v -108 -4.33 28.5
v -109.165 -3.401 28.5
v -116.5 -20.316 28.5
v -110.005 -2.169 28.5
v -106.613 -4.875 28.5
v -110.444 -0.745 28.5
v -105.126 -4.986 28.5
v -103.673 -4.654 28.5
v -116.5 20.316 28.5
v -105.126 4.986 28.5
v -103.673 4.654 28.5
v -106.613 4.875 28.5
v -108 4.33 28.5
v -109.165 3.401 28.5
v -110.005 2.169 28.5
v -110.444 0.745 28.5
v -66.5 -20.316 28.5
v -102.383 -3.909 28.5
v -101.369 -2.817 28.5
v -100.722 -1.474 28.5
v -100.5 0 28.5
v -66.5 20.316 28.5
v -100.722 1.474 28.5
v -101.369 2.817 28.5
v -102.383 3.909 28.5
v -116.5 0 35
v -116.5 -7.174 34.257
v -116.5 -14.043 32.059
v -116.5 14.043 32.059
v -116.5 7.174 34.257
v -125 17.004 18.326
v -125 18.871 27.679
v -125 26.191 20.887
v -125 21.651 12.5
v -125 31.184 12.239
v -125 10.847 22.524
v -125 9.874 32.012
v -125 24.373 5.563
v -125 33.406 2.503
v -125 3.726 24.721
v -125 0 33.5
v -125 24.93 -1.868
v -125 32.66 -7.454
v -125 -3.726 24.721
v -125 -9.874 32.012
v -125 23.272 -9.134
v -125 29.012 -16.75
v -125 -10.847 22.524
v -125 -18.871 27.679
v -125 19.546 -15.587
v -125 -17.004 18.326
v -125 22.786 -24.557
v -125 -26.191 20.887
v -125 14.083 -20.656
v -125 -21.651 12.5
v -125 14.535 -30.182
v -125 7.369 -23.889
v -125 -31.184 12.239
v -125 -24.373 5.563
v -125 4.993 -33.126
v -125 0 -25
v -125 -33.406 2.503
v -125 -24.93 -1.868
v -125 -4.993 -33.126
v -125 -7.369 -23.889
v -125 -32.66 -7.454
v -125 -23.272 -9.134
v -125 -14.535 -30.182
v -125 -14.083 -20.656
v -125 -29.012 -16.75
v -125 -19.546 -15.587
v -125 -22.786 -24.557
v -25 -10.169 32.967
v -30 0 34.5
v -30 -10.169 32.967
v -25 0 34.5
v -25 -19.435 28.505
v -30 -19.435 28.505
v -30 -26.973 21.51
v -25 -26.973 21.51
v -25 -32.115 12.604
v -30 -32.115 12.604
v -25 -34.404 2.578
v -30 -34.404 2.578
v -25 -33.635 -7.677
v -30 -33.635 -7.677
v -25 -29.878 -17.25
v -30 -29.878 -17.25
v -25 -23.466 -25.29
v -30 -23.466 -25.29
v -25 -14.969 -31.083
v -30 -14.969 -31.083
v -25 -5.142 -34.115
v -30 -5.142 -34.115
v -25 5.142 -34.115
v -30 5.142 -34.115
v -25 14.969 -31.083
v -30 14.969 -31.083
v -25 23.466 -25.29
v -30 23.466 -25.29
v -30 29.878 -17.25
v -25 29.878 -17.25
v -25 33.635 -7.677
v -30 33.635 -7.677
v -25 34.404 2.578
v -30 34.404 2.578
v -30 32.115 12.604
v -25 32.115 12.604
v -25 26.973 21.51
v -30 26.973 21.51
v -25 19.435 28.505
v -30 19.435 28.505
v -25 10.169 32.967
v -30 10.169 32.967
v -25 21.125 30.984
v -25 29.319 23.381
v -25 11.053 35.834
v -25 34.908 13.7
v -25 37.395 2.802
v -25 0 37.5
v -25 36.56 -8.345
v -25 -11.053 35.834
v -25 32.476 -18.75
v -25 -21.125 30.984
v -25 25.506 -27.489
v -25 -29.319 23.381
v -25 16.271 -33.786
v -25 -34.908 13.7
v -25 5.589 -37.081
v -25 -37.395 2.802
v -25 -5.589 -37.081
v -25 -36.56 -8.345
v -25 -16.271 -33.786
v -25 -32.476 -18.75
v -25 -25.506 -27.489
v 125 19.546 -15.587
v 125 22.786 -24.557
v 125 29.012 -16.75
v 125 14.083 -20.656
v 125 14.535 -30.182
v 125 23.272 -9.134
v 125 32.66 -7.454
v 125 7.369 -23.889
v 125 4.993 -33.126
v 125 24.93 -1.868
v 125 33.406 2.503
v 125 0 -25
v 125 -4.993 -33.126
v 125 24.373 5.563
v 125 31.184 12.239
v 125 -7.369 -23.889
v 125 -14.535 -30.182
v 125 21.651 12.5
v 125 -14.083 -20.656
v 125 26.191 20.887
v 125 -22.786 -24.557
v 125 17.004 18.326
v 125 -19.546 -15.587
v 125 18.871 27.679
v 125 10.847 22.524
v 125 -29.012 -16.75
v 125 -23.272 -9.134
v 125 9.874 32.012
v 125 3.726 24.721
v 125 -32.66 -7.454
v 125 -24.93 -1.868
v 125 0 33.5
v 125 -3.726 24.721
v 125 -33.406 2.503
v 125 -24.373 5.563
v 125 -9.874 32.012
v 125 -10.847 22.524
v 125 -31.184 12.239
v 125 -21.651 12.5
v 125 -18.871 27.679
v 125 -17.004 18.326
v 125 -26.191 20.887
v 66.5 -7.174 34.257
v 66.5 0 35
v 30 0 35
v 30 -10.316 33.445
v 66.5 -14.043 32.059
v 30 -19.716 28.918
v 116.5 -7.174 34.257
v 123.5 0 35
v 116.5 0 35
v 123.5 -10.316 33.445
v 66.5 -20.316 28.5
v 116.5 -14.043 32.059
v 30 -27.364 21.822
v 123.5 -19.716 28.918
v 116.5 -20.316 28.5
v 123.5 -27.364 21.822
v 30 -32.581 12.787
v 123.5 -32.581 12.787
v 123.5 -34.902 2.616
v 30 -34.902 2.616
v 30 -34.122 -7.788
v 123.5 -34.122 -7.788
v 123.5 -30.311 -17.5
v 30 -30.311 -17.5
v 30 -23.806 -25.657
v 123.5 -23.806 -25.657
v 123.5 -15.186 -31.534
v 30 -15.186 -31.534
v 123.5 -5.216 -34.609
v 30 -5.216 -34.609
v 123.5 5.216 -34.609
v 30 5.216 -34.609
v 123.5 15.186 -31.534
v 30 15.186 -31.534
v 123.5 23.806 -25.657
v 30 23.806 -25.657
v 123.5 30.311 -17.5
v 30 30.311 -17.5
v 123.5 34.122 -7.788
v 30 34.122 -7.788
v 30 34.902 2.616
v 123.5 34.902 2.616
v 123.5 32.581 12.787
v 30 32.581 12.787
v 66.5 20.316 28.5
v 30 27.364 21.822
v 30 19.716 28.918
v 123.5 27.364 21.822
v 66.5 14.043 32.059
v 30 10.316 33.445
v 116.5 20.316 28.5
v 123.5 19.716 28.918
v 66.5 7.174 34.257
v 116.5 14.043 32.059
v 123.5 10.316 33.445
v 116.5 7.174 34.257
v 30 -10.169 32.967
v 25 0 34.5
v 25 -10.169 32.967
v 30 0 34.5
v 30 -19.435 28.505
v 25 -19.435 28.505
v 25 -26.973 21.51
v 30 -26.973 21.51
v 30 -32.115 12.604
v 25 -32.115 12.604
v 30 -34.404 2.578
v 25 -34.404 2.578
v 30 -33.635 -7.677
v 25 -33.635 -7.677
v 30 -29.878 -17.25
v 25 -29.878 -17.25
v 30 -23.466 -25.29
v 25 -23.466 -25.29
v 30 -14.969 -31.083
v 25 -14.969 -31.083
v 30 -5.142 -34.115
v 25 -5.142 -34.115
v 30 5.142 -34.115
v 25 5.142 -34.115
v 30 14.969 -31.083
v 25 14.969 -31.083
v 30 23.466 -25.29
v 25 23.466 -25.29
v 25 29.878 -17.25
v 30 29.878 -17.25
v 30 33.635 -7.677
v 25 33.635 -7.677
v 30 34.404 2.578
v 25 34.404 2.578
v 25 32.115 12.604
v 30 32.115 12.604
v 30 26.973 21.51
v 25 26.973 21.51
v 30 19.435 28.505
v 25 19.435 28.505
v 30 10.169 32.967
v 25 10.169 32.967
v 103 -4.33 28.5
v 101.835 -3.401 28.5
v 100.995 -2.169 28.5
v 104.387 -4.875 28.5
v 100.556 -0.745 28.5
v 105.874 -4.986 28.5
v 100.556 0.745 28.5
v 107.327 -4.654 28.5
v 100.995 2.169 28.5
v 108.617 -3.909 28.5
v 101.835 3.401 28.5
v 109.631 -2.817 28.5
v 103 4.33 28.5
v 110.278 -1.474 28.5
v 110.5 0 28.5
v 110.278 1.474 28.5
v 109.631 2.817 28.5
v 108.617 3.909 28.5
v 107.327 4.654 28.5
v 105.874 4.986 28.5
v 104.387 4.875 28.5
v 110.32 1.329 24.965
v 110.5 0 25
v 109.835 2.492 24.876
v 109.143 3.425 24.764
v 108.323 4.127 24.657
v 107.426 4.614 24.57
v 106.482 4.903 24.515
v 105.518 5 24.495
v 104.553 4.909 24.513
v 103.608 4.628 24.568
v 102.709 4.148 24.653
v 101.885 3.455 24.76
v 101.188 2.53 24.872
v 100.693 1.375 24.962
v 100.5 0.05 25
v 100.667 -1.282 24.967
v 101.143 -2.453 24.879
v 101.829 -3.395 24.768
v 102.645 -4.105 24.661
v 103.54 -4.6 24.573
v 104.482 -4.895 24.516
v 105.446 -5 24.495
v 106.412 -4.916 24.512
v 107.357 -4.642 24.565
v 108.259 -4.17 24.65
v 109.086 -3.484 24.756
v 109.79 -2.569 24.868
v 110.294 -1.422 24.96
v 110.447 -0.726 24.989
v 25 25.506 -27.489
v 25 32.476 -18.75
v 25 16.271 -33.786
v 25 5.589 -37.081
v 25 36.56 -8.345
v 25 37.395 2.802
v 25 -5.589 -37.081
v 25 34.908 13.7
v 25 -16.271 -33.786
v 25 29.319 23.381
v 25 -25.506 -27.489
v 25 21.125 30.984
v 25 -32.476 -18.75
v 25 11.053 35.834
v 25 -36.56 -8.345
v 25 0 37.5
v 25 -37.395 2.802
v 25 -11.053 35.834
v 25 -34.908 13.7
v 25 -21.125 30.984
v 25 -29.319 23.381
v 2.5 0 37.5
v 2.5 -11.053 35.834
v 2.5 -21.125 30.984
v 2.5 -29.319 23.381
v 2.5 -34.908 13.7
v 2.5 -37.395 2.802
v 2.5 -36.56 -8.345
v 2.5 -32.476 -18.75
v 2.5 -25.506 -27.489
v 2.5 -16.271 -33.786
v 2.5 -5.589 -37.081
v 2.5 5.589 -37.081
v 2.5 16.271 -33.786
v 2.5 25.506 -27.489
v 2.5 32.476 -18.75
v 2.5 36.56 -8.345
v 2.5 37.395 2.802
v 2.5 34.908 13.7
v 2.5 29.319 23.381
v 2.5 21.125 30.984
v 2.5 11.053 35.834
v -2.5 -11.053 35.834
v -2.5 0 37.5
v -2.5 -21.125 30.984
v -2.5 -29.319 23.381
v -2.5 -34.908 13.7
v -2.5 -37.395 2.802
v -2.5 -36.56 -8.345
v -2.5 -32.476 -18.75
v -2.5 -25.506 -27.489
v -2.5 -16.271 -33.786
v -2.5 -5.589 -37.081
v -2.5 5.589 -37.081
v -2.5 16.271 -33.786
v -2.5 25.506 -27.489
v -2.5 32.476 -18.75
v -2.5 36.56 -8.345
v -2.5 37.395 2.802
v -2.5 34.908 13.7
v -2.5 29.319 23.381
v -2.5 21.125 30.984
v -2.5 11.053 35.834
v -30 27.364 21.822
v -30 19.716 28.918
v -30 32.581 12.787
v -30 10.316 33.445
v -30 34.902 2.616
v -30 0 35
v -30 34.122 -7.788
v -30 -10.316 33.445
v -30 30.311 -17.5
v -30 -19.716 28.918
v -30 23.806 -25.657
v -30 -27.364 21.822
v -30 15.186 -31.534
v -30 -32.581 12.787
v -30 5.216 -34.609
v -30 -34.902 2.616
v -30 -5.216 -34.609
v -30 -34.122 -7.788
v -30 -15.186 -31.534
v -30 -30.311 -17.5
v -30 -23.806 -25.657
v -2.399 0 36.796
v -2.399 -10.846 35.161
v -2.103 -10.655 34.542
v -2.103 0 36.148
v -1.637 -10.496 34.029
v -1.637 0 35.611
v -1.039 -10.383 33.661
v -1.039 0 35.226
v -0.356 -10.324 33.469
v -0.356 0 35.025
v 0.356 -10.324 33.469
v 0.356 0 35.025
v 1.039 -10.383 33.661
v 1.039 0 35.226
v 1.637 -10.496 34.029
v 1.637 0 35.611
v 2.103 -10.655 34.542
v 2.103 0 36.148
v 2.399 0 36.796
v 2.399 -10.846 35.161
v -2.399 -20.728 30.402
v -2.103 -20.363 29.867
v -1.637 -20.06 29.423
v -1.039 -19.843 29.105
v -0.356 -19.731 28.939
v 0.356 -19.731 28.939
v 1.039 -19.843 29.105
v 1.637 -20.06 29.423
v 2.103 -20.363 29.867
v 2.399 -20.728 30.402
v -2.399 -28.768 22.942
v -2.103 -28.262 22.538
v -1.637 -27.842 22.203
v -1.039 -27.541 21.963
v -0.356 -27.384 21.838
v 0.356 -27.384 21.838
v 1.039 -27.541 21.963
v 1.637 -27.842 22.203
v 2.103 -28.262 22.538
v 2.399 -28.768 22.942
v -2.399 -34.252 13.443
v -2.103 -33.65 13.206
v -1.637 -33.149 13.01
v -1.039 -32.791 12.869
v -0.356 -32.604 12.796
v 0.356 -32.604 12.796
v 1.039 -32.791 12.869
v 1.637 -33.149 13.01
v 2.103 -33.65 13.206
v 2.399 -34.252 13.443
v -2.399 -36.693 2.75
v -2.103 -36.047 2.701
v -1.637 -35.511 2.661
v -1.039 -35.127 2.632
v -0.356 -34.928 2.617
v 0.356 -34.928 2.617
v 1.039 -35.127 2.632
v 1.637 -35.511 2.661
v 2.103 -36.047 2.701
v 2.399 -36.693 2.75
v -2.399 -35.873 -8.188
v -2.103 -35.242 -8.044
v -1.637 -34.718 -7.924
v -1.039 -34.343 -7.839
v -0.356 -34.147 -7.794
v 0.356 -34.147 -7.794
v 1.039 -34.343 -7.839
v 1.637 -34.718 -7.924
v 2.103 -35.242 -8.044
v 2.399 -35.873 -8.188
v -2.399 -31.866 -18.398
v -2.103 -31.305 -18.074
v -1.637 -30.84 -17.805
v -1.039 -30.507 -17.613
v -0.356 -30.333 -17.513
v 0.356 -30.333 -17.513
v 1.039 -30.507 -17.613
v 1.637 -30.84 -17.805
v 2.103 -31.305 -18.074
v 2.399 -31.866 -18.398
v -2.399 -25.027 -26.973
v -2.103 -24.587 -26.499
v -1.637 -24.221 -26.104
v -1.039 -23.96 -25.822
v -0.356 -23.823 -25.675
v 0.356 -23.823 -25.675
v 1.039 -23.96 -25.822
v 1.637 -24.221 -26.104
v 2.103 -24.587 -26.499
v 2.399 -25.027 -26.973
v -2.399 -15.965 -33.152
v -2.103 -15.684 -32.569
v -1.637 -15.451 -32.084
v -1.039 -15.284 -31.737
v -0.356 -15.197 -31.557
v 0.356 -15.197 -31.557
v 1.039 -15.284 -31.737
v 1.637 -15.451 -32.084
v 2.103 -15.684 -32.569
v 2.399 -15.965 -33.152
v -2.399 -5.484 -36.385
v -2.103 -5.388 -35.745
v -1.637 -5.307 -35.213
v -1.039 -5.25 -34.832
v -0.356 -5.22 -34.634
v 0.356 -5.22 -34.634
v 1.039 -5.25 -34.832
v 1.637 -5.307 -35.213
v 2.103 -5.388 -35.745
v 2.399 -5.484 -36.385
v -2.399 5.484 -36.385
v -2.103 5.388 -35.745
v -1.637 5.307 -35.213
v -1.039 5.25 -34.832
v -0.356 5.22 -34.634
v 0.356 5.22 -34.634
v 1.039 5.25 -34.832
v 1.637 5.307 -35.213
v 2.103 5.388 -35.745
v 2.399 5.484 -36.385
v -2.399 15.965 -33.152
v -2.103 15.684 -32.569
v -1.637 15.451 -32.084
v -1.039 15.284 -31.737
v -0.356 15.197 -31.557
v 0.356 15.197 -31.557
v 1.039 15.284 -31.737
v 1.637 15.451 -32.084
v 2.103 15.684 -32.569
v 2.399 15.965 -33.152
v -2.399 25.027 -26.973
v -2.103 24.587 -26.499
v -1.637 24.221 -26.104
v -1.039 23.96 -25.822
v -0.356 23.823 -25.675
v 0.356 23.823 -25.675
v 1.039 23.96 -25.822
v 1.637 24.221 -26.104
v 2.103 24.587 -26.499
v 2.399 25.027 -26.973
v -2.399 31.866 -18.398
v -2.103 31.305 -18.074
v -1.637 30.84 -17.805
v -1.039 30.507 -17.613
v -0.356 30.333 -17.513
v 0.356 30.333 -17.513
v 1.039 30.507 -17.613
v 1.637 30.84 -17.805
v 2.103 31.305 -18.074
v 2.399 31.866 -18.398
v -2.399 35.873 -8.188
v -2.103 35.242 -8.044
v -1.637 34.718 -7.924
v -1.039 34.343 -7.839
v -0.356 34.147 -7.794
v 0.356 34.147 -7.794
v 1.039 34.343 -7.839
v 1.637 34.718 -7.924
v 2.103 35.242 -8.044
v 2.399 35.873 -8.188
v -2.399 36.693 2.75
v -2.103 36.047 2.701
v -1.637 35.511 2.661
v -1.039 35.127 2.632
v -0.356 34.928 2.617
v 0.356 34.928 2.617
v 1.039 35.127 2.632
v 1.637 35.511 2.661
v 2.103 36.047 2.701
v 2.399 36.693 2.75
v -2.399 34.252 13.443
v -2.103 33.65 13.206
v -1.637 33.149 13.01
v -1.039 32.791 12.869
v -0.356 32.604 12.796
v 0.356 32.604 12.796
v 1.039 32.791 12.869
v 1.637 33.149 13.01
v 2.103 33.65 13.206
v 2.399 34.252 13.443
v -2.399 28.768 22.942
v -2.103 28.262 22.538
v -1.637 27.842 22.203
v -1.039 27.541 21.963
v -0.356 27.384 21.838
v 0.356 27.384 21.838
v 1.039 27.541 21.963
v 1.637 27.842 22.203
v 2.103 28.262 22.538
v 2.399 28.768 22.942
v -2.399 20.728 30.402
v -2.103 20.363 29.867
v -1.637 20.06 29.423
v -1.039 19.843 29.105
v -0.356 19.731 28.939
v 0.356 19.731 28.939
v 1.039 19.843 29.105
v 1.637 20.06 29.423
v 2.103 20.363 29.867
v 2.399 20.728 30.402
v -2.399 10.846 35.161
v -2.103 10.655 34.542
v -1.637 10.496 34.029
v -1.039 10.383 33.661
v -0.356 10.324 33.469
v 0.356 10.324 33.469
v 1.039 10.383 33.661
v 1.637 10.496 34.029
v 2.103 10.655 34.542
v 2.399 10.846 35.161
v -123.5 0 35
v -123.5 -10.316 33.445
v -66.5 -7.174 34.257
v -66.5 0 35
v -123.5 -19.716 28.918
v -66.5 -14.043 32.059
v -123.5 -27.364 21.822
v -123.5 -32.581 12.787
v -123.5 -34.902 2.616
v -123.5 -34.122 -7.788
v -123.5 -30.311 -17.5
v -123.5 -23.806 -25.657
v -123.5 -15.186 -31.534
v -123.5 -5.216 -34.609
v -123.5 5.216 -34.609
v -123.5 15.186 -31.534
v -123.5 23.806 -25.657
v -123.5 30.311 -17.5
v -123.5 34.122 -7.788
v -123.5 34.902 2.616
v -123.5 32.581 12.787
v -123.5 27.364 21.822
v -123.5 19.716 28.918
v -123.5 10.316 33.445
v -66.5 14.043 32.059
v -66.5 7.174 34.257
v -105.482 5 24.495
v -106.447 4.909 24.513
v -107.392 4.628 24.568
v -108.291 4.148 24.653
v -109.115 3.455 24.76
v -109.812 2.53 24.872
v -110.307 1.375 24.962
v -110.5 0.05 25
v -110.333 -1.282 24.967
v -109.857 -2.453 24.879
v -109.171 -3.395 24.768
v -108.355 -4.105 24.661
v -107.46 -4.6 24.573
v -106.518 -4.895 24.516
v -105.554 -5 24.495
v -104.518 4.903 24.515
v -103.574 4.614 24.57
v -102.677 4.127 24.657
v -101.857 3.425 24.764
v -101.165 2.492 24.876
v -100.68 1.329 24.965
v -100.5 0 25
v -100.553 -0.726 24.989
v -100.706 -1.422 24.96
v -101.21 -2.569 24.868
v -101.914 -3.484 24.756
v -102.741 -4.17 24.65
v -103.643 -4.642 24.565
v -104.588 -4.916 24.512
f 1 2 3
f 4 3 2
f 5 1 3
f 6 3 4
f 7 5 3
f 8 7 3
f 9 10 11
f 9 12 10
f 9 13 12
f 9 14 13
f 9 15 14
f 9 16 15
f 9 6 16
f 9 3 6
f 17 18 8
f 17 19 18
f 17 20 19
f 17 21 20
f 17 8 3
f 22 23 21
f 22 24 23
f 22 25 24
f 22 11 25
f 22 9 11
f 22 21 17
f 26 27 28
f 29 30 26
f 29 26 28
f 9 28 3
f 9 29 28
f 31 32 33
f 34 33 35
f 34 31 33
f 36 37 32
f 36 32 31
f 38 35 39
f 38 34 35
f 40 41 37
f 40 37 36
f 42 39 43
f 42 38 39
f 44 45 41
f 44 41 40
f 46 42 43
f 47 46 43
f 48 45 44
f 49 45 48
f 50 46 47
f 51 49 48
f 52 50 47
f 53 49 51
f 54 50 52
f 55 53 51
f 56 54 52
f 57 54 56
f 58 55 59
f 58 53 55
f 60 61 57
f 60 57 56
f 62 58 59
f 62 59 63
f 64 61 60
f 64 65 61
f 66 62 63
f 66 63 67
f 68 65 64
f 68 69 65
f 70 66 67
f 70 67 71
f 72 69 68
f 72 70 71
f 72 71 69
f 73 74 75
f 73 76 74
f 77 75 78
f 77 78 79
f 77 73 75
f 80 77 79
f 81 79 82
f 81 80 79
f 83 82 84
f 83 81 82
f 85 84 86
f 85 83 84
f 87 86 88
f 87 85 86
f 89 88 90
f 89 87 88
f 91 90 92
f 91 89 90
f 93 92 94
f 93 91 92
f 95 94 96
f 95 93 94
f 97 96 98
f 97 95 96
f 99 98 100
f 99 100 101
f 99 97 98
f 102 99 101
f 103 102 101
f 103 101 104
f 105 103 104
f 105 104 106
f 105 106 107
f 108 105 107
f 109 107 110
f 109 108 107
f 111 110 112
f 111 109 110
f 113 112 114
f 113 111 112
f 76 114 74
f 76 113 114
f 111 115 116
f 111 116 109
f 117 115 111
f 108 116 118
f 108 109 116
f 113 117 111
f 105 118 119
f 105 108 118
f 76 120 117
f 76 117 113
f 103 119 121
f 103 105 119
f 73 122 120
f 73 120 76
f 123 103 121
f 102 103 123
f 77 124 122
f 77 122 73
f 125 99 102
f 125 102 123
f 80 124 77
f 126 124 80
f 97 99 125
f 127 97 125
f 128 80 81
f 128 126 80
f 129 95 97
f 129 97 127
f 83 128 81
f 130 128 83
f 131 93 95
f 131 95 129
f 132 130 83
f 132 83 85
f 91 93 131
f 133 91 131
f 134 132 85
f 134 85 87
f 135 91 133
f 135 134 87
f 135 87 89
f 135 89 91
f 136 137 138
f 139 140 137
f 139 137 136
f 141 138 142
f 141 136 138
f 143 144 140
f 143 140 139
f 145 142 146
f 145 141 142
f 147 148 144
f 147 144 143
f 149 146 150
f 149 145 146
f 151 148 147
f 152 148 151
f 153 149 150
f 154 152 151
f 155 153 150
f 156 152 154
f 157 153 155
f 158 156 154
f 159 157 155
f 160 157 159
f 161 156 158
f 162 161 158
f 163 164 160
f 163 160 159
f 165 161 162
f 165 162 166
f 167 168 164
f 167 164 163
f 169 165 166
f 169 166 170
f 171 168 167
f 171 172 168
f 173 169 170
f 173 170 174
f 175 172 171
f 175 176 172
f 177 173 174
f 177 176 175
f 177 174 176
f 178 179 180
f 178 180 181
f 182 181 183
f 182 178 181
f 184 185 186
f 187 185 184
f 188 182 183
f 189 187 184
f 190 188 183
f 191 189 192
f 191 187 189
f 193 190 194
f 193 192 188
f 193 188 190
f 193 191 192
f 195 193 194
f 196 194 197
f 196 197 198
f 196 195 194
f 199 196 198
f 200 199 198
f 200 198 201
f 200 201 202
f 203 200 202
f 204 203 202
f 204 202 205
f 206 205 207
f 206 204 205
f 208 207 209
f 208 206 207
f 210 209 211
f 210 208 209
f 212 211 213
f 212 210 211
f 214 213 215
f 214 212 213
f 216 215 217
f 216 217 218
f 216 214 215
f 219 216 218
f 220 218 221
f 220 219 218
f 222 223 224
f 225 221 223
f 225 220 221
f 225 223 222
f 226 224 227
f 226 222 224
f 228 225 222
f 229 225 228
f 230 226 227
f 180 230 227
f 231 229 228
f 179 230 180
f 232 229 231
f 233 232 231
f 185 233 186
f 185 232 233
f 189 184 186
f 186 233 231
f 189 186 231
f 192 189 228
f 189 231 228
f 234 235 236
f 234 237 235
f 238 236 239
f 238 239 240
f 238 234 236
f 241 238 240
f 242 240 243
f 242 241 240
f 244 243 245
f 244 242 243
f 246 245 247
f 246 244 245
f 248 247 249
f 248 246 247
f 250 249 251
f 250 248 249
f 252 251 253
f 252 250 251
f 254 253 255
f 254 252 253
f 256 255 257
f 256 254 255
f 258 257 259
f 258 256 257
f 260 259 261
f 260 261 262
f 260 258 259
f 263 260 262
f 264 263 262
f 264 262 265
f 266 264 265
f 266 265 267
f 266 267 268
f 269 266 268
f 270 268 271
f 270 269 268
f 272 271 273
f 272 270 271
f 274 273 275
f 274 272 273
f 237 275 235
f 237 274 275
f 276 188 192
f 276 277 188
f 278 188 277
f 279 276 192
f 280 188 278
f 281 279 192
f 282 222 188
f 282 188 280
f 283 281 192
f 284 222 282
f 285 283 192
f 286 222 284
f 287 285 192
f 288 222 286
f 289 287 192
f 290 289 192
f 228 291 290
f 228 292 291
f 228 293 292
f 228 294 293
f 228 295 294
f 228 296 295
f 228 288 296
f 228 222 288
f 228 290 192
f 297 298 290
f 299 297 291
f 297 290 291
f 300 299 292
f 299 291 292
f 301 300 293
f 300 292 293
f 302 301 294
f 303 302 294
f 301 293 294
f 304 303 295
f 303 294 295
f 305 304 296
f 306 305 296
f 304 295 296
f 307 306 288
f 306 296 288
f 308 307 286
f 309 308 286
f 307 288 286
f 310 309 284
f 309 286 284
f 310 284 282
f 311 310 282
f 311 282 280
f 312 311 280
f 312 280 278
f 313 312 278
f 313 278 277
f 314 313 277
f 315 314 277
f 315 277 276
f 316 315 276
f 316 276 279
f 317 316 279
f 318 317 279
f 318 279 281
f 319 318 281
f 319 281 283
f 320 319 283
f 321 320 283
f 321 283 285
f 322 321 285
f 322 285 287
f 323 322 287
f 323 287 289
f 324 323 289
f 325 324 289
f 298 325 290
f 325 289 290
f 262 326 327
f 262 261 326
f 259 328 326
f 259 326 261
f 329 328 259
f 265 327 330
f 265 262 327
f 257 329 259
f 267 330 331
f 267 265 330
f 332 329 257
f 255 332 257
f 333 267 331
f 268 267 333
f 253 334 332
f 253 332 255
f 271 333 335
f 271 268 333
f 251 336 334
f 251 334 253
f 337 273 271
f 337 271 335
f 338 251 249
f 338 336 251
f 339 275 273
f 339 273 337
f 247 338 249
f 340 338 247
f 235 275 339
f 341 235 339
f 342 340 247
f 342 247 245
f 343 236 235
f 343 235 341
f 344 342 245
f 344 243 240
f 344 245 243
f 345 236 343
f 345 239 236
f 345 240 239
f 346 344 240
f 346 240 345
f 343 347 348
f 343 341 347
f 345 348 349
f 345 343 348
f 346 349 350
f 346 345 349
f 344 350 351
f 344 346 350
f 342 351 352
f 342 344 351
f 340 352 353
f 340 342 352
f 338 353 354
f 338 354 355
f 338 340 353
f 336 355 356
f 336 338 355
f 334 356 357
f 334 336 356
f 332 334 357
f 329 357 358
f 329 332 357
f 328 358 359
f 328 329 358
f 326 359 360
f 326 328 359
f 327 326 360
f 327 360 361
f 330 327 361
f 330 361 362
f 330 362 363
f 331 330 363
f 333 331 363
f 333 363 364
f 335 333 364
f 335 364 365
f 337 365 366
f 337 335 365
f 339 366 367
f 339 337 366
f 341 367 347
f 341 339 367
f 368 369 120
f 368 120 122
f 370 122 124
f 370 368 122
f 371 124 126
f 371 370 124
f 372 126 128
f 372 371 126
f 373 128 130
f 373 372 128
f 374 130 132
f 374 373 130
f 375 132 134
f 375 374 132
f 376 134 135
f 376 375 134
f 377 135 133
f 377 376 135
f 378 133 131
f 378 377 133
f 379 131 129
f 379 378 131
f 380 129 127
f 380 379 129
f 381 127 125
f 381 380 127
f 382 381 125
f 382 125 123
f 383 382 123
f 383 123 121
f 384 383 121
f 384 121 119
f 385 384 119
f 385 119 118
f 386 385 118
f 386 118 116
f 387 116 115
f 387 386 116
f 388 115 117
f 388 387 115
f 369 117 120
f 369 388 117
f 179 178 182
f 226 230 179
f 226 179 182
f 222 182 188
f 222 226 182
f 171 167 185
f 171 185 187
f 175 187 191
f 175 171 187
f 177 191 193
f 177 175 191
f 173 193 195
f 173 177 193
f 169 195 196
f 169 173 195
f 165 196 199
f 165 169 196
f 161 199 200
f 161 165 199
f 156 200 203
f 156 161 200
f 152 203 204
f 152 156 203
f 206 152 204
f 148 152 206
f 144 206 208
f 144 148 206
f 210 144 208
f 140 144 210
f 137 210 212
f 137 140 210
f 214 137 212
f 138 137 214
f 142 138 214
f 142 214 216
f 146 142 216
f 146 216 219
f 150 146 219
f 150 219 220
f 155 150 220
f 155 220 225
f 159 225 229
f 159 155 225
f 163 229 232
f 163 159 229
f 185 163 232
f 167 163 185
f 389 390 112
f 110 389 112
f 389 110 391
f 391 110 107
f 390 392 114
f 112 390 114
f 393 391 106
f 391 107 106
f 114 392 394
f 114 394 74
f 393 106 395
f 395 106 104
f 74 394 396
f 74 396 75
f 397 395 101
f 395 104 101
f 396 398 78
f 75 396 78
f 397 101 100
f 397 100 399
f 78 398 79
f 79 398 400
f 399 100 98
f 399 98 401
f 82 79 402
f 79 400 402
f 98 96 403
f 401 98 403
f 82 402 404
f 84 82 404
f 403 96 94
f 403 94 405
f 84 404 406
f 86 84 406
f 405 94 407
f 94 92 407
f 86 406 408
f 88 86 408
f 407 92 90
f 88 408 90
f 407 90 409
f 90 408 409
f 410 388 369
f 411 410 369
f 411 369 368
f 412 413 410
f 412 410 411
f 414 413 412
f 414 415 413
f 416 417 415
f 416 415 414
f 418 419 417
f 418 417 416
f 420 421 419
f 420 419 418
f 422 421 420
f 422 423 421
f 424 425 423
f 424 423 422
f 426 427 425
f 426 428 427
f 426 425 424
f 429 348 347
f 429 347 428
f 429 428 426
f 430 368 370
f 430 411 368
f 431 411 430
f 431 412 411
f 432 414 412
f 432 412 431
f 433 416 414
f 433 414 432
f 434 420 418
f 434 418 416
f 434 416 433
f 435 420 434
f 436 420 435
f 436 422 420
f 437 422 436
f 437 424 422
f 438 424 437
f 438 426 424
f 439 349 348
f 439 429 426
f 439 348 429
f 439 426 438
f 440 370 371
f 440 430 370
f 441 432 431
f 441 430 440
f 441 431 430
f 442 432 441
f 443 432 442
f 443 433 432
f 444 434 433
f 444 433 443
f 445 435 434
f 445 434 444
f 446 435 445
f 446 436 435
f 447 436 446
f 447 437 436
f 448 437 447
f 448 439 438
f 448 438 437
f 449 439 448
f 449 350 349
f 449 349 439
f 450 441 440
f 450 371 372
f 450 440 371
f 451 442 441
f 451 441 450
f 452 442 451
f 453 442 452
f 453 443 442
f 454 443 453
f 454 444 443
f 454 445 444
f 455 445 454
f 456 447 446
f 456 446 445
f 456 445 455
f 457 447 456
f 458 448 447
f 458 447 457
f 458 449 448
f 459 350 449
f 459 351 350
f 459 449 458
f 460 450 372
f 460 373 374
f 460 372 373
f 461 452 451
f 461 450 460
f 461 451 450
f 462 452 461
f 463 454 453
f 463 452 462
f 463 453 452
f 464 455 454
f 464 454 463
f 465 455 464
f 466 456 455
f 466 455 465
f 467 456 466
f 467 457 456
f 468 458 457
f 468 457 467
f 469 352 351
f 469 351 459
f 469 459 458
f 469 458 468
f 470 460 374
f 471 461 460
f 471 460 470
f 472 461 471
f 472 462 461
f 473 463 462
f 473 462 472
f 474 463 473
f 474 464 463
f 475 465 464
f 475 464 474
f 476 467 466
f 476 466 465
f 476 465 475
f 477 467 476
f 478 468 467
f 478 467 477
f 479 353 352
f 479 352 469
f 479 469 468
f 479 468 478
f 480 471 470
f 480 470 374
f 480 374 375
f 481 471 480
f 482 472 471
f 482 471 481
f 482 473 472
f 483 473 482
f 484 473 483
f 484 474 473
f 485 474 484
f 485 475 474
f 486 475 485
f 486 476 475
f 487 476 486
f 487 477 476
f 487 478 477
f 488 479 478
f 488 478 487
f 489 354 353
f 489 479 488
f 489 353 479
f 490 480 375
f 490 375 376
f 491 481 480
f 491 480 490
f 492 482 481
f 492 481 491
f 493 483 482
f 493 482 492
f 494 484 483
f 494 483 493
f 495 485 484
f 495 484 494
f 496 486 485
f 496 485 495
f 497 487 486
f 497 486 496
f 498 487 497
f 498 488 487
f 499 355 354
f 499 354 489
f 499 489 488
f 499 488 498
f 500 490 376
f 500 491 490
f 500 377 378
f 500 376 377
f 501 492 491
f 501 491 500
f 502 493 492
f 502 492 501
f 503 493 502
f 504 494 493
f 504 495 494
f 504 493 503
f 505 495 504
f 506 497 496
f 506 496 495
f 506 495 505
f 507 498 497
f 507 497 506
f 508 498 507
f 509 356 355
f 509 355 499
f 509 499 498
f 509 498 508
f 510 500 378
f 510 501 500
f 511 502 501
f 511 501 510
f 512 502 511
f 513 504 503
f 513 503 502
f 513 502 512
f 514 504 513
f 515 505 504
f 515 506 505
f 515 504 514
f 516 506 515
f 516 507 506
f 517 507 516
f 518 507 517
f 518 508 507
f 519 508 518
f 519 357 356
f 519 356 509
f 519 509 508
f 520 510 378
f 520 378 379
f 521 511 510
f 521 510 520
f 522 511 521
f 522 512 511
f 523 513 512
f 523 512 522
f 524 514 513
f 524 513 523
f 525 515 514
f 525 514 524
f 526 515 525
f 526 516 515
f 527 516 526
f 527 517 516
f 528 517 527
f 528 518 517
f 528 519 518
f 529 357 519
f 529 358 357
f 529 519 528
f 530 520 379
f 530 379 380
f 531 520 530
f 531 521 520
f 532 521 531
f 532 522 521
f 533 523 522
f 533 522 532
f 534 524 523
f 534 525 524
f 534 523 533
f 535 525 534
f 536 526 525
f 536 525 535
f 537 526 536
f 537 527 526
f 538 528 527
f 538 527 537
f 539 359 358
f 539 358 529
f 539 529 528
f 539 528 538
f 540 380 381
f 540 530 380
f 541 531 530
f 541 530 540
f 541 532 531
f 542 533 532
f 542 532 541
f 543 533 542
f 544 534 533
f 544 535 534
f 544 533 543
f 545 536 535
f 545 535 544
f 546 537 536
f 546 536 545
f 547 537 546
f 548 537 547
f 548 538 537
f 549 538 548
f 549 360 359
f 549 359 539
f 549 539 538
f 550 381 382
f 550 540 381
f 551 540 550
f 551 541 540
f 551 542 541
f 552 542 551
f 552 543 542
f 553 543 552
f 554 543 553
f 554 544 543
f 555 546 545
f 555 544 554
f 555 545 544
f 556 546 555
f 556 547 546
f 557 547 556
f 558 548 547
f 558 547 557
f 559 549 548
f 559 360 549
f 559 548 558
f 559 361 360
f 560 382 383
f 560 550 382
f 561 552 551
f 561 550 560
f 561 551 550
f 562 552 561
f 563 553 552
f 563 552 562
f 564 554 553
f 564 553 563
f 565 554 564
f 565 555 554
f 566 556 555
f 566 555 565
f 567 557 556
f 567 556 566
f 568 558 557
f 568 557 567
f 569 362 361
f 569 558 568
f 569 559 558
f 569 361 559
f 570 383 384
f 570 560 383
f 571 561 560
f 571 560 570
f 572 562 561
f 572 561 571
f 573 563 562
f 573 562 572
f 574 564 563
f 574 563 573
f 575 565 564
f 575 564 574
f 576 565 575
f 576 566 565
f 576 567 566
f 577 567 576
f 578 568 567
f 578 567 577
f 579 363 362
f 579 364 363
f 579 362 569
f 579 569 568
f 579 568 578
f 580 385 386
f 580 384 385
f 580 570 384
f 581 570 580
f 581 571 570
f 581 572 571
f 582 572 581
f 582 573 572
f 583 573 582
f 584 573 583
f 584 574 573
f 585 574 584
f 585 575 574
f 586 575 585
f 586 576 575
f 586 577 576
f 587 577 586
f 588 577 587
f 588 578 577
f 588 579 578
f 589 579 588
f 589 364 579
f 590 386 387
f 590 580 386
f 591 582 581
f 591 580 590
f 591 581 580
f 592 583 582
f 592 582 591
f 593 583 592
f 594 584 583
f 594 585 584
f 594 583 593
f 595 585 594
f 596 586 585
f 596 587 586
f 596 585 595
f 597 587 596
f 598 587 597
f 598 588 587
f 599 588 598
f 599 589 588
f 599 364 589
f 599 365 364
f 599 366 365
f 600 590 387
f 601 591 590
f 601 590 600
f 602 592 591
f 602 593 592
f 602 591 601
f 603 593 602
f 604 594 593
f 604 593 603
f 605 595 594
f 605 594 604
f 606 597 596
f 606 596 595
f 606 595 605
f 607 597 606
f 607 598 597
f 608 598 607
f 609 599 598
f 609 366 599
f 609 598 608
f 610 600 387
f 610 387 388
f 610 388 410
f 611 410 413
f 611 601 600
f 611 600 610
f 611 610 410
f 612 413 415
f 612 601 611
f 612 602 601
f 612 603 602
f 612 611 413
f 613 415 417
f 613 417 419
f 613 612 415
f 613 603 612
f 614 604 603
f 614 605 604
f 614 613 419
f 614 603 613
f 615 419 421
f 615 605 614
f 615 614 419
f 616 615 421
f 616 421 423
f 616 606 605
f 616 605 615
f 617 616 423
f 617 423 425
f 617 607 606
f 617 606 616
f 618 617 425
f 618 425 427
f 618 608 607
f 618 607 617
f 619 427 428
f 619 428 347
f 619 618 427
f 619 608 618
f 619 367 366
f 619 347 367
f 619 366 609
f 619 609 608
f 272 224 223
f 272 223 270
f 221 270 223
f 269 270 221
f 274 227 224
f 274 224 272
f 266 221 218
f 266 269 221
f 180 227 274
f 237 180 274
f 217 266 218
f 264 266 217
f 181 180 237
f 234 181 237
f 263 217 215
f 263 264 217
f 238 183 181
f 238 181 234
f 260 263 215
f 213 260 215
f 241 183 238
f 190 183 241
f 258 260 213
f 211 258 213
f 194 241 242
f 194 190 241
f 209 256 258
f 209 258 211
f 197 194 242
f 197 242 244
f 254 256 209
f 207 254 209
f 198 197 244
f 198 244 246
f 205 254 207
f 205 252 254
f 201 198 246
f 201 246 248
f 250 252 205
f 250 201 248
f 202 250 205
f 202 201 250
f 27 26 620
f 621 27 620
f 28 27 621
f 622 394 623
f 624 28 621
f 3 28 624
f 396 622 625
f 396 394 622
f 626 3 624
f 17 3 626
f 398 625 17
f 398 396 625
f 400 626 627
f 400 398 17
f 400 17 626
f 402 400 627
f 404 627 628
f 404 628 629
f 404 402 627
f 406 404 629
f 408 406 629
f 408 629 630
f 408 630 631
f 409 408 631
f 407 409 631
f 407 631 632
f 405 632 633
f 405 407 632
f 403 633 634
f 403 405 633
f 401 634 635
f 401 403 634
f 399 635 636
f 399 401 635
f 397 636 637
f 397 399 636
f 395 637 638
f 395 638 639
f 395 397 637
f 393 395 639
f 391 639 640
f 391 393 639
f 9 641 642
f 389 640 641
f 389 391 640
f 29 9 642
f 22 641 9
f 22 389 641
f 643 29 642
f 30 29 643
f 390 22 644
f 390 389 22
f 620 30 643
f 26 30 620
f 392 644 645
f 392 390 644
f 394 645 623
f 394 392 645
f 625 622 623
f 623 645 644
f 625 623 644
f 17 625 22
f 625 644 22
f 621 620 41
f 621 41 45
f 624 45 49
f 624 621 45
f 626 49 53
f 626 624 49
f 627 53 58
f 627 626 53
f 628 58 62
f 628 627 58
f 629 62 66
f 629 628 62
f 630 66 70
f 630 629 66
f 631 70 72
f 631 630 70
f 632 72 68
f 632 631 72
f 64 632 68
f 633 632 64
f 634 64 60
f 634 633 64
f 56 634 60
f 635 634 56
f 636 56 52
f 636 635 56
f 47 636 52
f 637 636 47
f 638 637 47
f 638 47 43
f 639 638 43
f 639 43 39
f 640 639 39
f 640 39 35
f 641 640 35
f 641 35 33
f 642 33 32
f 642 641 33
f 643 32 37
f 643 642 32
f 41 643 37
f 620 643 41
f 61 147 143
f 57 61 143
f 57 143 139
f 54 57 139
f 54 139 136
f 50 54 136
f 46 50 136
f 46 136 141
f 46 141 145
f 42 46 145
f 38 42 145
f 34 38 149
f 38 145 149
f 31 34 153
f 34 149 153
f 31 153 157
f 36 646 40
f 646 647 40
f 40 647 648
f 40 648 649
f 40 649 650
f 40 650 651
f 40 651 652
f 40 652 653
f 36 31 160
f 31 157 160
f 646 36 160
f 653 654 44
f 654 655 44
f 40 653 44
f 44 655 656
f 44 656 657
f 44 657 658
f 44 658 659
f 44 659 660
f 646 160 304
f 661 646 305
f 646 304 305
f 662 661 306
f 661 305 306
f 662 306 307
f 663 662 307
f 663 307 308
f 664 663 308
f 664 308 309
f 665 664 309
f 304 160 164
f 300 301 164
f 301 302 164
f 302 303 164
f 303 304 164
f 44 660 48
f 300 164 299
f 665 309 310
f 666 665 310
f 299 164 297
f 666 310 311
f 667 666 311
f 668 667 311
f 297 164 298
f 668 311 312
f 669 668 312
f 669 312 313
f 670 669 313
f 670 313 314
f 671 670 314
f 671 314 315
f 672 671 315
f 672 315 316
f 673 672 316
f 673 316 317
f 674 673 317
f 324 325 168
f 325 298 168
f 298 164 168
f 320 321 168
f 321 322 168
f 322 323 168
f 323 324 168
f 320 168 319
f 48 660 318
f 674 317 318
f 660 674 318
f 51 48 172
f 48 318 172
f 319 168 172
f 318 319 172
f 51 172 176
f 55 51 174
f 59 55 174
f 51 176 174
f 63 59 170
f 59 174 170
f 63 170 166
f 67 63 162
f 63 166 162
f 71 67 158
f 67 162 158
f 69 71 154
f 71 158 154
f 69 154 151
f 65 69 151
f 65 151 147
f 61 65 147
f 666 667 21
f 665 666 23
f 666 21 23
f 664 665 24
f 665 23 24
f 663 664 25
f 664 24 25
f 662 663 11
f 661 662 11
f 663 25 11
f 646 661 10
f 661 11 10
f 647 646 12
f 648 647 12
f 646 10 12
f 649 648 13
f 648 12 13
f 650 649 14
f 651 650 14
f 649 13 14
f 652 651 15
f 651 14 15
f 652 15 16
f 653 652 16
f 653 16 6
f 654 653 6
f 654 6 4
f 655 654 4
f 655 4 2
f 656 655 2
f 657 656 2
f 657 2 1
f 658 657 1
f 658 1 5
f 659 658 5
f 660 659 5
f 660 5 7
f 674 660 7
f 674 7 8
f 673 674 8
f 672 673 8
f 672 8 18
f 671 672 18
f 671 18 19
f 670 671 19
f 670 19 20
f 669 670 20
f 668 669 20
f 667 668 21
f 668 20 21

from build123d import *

# Parameters (mm, degrees)
CHAFL_N2_SIZE          = 1.5
CHAFL_N3_SIZE          = 1.5
CROQUIS2_R             = 2.5
CROQUIS2_W             = 5
CROQUIS2_H             = 0.5
CROQUIS5_R             = 25
CORTAR_EXTRUIR5_DEPTH  = 300
CROQUIS3_W             = 50
CROQUIS3_H             = 50
CORTAR_EXTRUIR9_DEPTH  = 6.5
CROQUIS7_R             = 5
CORTAR_EXTRUIR12_DEPTH = 46.5


with BuildPart() as part:
    # Croquis1 → Revolución1 (revolve)
    with BuildSketch(Plane(origin=(0, 0, 0), x_dir=(1, 0, 0), z_dir=(0, 1, 0)), mode=Mode.PRIVATE) as revoluci_n1_sk:
        Polygon((-25, 37.5), (25, 37.5), (25, 35), (125, 35), (125, 0), (-125, 0), (-125, 35), (-25, 35), align=None)
    revolve(revoluci_n1_sk.sketch.rotate(Axis((-200, 0, 0), (1, 0, 0)), 180), axis=Axis((-200, 0, 0), (1, 0, 0)))

    # Chaflán2
    chafl_n2_edges = [part.edges().sort_by_distance(p)[0] for p in [
        (-125, 0, -35),
    ]]
    chamfer(chafl_n2_edges, length=CHAFL_N2_SIZE)

    # Chaflán3
    chafl_n3_edges = [part.edges().sort_by_distance(p)[0] for p in [
        (125, 0, -35),
    ]]
    chamfer(chafl_n3_edges, length=CHAFL_N3_SIZE)

    # Croquis2 → Cortar-Revolución1 (revolve, cut)
    with BuildSketch(Plane.XY, mode=Mode.PRIVATE) as cortar_revoluci_n1_sk:
        with Locations((0, 37.5)):
            Circle(CROQUIS2_R)
        with Locations((-27.5, 34.75)):
            Rectangle(CROQUIS2_W, CROQUIS2_H)
        with Locations((27.5, 34.75)):
            Rectangle(CROQUIS2_W, CROQUIS2_H)
    revolve(cortar_revoluci_n1_sk.sketch.rotate(Axis((-200, 0, 0), (1, 0, 0)), 90), axis=Axis((-200, 0, 0), (1, 0, 0)), mode=Mode.SUBTRACT)

    # Croquis5 → Cortar-Extruir5 (cut)
    with BuildSketch(Plane(origin=(125, 0, 0), x_dir=(0, 0, -1), z_dir=(1, 0, 0))):
        Circle(CROQUIS5_R)
    extrude(amount=-CORTAR_EXTRUIR5_DEPTH, mode=Mode.SUBTRACT)

    # Croquis3 → Cortar-Extruir9 (cut)
    with BuildSketch(Plane.XY.offset(35)):
        with Locations((91.5, 0)):
            Rectangle(CROQUIS3_W, CROQUIS3_H)
        with Locations((-91.5, 0)):
            Rectangle(CROQUIS3_W, CROQUIS3_H)
    extrude(amount=-CORTAR_EXTRUIR9_DEPTH, mode=Mode.SUBTRACT)

    # Croquis7 → Cortar-Extruir12 (cut)
    with BuildSketch(Plane.XY.offset(28.5)):
        with Locations((-105.5, 0)):
            Circle(CROQUIS7_R)
        with Locations((105.5, 0)):
            Circle(CROQUIS7_R)
    extrude(amount=-CORTAR_EXTRUIR12_DEPTH, mode=Mode.SUBTRACT)


solid = part.part
